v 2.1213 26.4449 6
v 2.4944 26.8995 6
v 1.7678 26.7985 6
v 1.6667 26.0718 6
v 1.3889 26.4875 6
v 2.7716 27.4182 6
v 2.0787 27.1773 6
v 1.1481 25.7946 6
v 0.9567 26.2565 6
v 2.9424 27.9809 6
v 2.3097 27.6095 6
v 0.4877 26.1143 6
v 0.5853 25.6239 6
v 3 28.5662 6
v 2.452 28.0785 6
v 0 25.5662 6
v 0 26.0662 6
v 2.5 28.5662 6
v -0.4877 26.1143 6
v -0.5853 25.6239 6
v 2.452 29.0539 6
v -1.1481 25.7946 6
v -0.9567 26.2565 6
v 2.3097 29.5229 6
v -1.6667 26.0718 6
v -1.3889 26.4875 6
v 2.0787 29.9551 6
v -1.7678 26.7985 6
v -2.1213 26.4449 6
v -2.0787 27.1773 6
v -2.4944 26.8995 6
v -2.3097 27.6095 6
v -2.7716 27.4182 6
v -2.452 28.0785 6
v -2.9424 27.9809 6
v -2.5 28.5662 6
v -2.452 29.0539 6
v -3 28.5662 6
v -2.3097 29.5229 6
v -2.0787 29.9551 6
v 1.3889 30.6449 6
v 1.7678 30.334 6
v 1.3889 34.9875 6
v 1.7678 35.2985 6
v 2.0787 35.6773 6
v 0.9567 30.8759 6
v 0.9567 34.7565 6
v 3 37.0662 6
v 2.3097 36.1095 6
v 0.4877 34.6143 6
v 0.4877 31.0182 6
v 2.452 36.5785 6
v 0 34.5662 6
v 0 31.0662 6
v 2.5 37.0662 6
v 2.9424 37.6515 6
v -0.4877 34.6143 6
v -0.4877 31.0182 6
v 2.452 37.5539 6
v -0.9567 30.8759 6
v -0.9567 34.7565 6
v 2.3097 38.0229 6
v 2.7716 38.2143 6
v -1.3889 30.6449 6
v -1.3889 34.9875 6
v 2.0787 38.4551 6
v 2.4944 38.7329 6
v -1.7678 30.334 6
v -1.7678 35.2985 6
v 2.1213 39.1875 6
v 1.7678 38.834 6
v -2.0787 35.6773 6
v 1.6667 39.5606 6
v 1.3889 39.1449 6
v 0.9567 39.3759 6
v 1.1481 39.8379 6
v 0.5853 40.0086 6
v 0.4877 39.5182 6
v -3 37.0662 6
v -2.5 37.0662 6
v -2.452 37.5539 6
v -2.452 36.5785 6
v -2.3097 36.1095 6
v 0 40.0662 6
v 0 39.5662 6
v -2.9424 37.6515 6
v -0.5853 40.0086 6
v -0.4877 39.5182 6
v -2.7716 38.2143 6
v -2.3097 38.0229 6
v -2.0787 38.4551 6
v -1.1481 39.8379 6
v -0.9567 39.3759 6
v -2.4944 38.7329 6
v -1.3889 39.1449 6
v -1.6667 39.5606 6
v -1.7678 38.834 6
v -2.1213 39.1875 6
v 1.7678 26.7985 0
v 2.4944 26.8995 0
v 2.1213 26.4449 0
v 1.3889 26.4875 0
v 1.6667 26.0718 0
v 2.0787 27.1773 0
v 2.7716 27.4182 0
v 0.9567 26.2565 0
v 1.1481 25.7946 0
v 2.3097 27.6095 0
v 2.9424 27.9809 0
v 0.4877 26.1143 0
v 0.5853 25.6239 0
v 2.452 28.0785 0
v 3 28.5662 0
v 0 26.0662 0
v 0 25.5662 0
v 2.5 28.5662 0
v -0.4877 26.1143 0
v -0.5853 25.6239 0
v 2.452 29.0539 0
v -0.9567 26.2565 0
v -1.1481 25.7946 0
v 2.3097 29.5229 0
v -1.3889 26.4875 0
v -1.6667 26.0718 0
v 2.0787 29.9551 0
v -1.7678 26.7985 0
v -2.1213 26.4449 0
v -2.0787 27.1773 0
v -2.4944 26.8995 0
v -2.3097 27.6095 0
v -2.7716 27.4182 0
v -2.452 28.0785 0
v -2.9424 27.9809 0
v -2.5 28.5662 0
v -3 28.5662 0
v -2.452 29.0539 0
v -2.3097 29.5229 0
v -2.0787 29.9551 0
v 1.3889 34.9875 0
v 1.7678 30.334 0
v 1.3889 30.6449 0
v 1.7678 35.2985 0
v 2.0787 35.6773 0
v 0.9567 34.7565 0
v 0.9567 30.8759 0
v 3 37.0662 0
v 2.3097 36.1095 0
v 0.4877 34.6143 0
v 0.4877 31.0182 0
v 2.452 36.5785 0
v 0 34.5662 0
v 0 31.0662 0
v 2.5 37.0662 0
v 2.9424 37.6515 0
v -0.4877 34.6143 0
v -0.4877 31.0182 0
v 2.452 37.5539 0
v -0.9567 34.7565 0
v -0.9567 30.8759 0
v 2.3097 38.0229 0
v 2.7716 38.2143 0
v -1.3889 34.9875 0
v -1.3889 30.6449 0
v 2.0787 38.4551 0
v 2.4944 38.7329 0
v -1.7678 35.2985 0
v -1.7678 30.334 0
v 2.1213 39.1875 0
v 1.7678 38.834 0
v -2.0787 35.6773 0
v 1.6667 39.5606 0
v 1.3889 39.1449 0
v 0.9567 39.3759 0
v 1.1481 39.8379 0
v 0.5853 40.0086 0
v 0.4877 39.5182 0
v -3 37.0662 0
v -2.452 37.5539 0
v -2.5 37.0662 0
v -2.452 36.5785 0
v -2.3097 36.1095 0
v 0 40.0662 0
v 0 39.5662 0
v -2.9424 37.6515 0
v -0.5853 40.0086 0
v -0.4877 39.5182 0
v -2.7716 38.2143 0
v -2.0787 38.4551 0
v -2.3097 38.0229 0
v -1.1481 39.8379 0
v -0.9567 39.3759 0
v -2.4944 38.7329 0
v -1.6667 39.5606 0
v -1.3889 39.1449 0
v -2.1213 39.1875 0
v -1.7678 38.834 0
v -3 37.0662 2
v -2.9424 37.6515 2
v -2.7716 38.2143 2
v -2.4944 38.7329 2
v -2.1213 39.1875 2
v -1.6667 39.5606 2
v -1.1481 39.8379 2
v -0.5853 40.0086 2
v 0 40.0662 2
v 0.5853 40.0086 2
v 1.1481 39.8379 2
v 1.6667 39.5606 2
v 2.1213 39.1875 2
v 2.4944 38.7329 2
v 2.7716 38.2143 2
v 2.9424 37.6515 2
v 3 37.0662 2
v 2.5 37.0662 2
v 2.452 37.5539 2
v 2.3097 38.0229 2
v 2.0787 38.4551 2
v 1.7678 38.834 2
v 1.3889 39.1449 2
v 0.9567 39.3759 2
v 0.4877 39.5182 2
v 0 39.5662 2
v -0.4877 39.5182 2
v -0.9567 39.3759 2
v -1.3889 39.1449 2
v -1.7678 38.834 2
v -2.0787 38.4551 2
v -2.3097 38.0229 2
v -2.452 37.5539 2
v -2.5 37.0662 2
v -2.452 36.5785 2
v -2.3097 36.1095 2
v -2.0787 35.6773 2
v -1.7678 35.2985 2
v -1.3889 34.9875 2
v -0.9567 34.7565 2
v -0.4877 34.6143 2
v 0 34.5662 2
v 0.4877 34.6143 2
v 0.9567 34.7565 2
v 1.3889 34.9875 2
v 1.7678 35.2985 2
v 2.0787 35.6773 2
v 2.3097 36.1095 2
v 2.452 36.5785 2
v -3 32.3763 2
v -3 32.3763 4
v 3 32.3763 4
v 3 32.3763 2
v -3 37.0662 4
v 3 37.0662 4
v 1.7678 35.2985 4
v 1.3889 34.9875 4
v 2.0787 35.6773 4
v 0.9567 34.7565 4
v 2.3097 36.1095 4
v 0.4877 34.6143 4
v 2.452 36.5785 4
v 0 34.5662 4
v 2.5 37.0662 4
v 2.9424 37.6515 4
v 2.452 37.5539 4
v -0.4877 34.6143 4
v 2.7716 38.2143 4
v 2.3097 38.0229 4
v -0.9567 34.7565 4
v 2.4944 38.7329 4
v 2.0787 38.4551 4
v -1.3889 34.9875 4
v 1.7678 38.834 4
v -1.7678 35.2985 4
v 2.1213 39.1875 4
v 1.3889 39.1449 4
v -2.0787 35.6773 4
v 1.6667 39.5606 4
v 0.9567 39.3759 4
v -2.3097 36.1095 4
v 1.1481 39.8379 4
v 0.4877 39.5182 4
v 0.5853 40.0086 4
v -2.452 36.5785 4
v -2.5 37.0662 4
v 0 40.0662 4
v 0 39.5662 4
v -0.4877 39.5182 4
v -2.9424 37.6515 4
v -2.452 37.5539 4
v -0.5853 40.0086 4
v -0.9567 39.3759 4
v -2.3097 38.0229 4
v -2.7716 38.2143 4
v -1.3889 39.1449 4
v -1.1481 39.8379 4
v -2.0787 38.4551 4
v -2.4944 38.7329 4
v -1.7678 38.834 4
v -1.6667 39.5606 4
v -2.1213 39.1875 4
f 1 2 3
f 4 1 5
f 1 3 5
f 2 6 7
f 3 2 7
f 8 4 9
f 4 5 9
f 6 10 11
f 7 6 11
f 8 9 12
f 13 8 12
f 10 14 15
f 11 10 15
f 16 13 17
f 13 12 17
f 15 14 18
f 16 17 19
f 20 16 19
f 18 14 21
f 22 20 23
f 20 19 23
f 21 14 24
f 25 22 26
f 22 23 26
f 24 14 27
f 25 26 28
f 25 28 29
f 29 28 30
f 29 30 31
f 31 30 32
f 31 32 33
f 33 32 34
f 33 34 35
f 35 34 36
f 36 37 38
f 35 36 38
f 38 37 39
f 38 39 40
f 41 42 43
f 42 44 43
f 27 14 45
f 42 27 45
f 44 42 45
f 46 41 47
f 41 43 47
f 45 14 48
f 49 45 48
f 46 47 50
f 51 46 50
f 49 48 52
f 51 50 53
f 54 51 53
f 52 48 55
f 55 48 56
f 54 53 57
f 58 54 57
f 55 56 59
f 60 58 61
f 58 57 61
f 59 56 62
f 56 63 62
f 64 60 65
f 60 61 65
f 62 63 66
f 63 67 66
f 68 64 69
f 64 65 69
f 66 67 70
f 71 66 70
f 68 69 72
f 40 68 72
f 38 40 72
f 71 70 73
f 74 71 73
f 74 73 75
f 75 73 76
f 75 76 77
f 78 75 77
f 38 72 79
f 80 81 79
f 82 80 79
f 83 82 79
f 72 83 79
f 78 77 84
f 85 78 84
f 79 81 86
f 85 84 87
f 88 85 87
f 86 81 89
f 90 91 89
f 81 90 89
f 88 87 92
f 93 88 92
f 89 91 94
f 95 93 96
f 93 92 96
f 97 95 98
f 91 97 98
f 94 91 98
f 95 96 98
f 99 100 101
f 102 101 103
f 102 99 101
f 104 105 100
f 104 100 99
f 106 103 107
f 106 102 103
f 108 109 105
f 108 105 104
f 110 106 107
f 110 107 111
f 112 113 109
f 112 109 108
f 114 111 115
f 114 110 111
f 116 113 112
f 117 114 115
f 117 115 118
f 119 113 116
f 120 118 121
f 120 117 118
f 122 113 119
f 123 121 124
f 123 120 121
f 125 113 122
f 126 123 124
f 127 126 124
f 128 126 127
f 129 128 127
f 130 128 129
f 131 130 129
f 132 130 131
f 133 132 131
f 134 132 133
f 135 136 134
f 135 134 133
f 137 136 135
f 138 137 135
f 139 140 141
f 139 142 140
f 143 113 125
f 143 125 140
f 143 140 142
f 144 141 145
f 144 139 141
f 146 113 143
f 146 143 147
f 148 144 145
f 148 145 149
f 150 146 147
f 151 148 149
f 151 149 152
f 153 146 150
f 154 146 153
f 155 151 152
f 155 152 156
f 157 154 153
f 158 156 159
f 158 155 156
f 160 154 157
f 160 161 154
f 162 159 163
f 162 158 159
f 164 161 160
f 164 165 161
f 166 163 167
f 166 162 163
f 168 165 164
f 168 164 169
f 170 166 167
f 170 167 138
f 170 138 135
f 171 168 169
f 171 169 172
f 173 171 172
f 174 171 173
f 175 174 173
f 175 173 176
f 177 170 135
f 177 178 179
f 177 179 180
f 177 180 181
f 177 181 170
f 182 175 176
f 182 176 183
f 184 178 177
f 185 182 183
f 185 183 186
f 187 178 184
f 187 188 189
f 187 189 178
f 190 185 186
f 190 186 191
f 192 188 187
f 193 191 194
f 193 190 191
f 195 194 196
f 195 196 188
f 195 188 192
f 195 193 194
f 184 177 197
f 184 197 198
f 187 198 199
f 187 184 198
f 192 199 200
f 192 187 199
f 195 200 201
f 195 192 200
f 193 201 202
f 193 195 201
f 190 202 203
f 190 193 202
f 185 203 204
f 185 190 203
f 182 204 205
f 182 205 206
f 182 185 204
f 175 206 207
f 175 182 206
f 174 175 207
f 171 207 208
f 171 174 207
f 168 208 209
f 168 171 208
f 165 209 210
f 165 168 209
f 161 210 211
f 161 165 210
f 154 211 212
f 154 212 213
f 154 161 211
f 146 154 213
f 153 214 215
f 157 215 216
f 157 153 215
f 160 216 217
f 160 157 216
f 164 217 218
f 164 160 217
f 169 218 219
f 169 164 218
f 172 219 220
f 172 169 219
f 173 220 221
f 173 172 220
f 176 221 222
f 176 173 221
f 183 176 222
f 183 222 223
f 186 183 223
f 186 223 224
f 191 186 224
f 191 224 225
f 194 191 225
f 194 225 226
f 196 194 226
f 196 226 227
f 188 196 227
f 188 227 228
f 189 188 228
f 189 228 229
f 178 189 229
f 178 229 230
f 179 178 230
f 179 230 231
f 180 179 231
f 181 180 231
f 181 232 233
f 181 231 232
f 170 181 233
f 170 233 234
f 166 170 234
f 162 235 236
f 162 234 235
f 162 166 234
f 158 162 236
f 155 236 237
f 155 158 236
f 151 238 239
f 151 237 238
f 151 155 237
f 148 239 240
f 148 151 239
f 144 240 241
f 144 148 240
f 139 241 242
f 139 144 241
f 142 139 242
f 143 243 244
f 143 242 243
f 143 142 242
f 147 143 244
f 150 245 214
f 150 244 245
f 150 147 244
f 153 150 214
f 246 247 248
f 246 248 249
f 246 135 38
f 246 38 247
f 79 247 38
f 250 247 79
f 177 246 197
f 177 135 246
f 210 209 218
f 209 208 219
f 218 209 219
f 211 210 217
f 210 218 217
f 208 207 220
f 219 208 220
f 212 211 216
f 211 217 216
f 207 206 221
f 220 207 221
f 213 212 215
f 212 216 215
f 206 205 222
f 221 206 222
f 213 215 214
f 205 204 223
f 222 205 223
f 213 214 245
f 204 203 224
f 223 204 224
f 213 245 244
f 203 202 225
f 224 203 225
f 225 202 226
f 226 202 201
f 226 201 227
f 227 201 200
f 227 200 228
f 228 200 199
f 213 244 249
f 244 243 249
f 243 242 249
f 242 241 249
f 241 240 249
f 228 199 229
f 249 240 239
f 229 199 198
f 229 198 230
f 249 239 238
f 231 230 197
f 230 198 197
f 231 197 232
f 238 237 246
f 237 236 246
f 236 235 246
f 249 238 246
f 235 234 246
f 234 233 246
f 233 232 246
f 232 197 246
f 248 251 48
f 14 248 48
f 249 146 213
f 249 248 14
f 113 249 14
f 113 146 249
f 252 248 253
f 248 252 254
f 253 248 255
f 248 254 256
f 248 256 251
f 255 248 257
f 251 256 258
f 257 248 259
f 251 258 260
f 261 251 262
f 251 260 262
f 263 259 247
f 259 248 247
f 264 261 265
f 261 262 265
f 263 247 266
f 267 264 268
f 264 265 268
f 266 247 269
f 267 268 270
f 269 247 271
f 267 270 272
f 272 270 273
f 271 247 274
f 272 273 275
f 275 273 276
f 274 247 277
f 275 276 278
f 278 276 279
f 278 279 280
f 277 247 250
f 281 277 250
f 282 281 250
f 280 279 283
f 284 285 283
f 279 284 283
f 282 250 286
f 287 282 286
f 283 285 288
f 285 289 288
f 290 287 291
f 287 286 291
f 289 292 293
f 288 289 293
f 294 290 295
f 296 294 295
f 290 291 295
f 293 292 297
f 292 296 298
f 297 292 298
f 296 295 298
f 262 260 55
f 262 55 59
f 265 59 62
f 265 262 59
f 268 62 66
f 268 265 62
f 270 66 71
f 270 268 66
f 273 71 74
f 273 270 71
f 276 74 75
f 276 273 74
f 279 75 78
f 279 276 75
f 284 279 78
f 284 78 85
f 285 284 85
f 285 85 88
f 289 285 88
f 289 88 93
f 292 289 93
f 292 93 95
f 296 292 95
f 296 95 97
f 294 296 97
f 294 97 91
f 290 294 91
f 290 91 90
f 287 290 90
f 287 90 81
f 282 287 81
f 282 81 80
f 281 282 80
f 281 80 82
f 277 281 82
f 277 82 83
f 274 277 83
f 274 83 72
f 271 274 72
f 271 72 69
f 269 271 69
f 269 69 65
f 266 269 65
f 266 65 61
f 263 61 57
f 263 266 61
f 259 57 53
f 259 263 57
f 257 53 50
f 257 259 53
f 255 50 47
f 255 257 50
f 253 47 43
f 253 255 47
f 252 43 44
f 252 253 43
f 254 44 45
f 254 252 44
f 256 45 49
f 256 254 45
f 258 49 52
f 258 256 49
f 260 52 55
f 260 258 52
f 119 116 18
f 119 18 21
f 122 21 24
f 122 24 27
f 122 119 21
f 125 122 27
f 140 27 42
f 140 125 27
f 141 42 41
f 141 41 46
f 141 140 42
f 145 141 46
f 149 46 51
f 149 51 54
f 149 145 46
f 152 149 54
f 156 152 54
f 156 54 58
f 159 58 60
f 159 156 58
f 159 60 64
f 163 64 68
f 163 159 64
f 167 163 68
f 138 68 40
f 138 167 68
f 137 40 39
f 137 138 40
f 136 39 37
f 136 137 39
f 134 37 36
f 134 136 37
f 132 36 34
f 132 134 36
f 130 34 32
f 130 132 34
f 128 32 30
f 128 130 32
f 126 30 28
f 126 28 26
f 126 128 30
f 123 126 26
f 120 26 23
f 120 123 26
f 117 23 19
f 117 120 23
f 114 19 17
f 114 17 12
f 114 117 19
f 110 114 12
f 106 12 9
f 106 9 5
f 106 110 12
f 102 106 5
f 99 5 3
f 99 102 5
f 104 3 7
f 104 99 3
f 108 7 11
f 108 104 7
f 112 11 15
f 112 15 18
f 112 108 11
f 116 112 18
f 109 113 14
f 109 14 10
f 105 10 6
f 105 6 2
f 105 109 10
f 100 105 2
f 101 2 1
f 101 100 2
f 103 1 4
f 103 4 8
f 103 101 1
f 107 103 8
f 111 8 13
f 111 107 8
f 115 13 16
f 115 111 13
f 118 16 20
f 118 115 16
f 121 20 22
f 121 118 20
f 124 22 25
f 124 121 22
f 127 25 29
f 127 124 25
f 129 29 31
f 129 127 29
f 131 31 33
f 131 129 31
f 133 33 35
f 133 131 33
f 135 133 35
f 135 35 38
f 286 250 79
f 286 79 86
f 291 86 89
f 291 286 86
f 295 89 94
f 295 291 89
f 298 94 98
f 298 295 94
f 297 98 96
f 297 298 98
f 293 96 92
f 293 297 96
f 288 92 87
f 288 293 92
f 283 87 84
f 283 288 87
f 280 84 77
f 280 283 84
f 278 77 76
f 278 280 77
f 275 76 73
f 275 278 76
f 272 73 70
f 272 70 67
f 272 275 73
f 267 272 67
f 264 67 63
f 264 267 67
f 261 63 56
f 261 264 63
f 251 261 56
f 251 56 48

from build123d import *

# Parameters (mm, degrees)
SKETCH1_R           = 2.5
BOSS_EXTRUDE1_DEPTH = 6
CUT_EXTRUDE2_DEPTH  = 41.954878106


with BuildPart() as part:
    # Sketch1 → Boss-Extrude1 (new body)
    with BuildSketch(Plane.XY):
        with BuildLine():
            Line((3, 37.066220694), (3, 28.566220694))
            ThreePointArc((3, 28.566220694), (0, 25.566220694), (-3, 28.566220694))
            Line((-3, 28.566220694), (-3, 37.066220694))
            ThreePointArc((-3, 37.066220694), (0, 40.066220694), (3, 37.066220694))
        make_face()
        with Locations((0, 37.066220694)):
            Circle(SKETCH1_R, mode=Mode.SUBTRACT)
        with Locations((0, 28.566220694)):
            Circle(SKETCH1_R, mode=Mode.SUBTRACT)
    extrude(amount=BOSS_EXTRUDE1_DEPTH)

    # Sketch2 → Cut-Extrude2 (cut, through all)
    with BuildSketch(Plane.ZY.offset(3)):
        Polygon((2, 37.066220694), (2, 41.792397486), (4, 41.792397486), (4, 37.066220694), (4, 32.376323295), (2, 32.376323295), align=None)
    extrude(amount=-CUT_EXTRUDE2_DEPTH, mode=Mode.SUBTRACT)


solid = part.part
